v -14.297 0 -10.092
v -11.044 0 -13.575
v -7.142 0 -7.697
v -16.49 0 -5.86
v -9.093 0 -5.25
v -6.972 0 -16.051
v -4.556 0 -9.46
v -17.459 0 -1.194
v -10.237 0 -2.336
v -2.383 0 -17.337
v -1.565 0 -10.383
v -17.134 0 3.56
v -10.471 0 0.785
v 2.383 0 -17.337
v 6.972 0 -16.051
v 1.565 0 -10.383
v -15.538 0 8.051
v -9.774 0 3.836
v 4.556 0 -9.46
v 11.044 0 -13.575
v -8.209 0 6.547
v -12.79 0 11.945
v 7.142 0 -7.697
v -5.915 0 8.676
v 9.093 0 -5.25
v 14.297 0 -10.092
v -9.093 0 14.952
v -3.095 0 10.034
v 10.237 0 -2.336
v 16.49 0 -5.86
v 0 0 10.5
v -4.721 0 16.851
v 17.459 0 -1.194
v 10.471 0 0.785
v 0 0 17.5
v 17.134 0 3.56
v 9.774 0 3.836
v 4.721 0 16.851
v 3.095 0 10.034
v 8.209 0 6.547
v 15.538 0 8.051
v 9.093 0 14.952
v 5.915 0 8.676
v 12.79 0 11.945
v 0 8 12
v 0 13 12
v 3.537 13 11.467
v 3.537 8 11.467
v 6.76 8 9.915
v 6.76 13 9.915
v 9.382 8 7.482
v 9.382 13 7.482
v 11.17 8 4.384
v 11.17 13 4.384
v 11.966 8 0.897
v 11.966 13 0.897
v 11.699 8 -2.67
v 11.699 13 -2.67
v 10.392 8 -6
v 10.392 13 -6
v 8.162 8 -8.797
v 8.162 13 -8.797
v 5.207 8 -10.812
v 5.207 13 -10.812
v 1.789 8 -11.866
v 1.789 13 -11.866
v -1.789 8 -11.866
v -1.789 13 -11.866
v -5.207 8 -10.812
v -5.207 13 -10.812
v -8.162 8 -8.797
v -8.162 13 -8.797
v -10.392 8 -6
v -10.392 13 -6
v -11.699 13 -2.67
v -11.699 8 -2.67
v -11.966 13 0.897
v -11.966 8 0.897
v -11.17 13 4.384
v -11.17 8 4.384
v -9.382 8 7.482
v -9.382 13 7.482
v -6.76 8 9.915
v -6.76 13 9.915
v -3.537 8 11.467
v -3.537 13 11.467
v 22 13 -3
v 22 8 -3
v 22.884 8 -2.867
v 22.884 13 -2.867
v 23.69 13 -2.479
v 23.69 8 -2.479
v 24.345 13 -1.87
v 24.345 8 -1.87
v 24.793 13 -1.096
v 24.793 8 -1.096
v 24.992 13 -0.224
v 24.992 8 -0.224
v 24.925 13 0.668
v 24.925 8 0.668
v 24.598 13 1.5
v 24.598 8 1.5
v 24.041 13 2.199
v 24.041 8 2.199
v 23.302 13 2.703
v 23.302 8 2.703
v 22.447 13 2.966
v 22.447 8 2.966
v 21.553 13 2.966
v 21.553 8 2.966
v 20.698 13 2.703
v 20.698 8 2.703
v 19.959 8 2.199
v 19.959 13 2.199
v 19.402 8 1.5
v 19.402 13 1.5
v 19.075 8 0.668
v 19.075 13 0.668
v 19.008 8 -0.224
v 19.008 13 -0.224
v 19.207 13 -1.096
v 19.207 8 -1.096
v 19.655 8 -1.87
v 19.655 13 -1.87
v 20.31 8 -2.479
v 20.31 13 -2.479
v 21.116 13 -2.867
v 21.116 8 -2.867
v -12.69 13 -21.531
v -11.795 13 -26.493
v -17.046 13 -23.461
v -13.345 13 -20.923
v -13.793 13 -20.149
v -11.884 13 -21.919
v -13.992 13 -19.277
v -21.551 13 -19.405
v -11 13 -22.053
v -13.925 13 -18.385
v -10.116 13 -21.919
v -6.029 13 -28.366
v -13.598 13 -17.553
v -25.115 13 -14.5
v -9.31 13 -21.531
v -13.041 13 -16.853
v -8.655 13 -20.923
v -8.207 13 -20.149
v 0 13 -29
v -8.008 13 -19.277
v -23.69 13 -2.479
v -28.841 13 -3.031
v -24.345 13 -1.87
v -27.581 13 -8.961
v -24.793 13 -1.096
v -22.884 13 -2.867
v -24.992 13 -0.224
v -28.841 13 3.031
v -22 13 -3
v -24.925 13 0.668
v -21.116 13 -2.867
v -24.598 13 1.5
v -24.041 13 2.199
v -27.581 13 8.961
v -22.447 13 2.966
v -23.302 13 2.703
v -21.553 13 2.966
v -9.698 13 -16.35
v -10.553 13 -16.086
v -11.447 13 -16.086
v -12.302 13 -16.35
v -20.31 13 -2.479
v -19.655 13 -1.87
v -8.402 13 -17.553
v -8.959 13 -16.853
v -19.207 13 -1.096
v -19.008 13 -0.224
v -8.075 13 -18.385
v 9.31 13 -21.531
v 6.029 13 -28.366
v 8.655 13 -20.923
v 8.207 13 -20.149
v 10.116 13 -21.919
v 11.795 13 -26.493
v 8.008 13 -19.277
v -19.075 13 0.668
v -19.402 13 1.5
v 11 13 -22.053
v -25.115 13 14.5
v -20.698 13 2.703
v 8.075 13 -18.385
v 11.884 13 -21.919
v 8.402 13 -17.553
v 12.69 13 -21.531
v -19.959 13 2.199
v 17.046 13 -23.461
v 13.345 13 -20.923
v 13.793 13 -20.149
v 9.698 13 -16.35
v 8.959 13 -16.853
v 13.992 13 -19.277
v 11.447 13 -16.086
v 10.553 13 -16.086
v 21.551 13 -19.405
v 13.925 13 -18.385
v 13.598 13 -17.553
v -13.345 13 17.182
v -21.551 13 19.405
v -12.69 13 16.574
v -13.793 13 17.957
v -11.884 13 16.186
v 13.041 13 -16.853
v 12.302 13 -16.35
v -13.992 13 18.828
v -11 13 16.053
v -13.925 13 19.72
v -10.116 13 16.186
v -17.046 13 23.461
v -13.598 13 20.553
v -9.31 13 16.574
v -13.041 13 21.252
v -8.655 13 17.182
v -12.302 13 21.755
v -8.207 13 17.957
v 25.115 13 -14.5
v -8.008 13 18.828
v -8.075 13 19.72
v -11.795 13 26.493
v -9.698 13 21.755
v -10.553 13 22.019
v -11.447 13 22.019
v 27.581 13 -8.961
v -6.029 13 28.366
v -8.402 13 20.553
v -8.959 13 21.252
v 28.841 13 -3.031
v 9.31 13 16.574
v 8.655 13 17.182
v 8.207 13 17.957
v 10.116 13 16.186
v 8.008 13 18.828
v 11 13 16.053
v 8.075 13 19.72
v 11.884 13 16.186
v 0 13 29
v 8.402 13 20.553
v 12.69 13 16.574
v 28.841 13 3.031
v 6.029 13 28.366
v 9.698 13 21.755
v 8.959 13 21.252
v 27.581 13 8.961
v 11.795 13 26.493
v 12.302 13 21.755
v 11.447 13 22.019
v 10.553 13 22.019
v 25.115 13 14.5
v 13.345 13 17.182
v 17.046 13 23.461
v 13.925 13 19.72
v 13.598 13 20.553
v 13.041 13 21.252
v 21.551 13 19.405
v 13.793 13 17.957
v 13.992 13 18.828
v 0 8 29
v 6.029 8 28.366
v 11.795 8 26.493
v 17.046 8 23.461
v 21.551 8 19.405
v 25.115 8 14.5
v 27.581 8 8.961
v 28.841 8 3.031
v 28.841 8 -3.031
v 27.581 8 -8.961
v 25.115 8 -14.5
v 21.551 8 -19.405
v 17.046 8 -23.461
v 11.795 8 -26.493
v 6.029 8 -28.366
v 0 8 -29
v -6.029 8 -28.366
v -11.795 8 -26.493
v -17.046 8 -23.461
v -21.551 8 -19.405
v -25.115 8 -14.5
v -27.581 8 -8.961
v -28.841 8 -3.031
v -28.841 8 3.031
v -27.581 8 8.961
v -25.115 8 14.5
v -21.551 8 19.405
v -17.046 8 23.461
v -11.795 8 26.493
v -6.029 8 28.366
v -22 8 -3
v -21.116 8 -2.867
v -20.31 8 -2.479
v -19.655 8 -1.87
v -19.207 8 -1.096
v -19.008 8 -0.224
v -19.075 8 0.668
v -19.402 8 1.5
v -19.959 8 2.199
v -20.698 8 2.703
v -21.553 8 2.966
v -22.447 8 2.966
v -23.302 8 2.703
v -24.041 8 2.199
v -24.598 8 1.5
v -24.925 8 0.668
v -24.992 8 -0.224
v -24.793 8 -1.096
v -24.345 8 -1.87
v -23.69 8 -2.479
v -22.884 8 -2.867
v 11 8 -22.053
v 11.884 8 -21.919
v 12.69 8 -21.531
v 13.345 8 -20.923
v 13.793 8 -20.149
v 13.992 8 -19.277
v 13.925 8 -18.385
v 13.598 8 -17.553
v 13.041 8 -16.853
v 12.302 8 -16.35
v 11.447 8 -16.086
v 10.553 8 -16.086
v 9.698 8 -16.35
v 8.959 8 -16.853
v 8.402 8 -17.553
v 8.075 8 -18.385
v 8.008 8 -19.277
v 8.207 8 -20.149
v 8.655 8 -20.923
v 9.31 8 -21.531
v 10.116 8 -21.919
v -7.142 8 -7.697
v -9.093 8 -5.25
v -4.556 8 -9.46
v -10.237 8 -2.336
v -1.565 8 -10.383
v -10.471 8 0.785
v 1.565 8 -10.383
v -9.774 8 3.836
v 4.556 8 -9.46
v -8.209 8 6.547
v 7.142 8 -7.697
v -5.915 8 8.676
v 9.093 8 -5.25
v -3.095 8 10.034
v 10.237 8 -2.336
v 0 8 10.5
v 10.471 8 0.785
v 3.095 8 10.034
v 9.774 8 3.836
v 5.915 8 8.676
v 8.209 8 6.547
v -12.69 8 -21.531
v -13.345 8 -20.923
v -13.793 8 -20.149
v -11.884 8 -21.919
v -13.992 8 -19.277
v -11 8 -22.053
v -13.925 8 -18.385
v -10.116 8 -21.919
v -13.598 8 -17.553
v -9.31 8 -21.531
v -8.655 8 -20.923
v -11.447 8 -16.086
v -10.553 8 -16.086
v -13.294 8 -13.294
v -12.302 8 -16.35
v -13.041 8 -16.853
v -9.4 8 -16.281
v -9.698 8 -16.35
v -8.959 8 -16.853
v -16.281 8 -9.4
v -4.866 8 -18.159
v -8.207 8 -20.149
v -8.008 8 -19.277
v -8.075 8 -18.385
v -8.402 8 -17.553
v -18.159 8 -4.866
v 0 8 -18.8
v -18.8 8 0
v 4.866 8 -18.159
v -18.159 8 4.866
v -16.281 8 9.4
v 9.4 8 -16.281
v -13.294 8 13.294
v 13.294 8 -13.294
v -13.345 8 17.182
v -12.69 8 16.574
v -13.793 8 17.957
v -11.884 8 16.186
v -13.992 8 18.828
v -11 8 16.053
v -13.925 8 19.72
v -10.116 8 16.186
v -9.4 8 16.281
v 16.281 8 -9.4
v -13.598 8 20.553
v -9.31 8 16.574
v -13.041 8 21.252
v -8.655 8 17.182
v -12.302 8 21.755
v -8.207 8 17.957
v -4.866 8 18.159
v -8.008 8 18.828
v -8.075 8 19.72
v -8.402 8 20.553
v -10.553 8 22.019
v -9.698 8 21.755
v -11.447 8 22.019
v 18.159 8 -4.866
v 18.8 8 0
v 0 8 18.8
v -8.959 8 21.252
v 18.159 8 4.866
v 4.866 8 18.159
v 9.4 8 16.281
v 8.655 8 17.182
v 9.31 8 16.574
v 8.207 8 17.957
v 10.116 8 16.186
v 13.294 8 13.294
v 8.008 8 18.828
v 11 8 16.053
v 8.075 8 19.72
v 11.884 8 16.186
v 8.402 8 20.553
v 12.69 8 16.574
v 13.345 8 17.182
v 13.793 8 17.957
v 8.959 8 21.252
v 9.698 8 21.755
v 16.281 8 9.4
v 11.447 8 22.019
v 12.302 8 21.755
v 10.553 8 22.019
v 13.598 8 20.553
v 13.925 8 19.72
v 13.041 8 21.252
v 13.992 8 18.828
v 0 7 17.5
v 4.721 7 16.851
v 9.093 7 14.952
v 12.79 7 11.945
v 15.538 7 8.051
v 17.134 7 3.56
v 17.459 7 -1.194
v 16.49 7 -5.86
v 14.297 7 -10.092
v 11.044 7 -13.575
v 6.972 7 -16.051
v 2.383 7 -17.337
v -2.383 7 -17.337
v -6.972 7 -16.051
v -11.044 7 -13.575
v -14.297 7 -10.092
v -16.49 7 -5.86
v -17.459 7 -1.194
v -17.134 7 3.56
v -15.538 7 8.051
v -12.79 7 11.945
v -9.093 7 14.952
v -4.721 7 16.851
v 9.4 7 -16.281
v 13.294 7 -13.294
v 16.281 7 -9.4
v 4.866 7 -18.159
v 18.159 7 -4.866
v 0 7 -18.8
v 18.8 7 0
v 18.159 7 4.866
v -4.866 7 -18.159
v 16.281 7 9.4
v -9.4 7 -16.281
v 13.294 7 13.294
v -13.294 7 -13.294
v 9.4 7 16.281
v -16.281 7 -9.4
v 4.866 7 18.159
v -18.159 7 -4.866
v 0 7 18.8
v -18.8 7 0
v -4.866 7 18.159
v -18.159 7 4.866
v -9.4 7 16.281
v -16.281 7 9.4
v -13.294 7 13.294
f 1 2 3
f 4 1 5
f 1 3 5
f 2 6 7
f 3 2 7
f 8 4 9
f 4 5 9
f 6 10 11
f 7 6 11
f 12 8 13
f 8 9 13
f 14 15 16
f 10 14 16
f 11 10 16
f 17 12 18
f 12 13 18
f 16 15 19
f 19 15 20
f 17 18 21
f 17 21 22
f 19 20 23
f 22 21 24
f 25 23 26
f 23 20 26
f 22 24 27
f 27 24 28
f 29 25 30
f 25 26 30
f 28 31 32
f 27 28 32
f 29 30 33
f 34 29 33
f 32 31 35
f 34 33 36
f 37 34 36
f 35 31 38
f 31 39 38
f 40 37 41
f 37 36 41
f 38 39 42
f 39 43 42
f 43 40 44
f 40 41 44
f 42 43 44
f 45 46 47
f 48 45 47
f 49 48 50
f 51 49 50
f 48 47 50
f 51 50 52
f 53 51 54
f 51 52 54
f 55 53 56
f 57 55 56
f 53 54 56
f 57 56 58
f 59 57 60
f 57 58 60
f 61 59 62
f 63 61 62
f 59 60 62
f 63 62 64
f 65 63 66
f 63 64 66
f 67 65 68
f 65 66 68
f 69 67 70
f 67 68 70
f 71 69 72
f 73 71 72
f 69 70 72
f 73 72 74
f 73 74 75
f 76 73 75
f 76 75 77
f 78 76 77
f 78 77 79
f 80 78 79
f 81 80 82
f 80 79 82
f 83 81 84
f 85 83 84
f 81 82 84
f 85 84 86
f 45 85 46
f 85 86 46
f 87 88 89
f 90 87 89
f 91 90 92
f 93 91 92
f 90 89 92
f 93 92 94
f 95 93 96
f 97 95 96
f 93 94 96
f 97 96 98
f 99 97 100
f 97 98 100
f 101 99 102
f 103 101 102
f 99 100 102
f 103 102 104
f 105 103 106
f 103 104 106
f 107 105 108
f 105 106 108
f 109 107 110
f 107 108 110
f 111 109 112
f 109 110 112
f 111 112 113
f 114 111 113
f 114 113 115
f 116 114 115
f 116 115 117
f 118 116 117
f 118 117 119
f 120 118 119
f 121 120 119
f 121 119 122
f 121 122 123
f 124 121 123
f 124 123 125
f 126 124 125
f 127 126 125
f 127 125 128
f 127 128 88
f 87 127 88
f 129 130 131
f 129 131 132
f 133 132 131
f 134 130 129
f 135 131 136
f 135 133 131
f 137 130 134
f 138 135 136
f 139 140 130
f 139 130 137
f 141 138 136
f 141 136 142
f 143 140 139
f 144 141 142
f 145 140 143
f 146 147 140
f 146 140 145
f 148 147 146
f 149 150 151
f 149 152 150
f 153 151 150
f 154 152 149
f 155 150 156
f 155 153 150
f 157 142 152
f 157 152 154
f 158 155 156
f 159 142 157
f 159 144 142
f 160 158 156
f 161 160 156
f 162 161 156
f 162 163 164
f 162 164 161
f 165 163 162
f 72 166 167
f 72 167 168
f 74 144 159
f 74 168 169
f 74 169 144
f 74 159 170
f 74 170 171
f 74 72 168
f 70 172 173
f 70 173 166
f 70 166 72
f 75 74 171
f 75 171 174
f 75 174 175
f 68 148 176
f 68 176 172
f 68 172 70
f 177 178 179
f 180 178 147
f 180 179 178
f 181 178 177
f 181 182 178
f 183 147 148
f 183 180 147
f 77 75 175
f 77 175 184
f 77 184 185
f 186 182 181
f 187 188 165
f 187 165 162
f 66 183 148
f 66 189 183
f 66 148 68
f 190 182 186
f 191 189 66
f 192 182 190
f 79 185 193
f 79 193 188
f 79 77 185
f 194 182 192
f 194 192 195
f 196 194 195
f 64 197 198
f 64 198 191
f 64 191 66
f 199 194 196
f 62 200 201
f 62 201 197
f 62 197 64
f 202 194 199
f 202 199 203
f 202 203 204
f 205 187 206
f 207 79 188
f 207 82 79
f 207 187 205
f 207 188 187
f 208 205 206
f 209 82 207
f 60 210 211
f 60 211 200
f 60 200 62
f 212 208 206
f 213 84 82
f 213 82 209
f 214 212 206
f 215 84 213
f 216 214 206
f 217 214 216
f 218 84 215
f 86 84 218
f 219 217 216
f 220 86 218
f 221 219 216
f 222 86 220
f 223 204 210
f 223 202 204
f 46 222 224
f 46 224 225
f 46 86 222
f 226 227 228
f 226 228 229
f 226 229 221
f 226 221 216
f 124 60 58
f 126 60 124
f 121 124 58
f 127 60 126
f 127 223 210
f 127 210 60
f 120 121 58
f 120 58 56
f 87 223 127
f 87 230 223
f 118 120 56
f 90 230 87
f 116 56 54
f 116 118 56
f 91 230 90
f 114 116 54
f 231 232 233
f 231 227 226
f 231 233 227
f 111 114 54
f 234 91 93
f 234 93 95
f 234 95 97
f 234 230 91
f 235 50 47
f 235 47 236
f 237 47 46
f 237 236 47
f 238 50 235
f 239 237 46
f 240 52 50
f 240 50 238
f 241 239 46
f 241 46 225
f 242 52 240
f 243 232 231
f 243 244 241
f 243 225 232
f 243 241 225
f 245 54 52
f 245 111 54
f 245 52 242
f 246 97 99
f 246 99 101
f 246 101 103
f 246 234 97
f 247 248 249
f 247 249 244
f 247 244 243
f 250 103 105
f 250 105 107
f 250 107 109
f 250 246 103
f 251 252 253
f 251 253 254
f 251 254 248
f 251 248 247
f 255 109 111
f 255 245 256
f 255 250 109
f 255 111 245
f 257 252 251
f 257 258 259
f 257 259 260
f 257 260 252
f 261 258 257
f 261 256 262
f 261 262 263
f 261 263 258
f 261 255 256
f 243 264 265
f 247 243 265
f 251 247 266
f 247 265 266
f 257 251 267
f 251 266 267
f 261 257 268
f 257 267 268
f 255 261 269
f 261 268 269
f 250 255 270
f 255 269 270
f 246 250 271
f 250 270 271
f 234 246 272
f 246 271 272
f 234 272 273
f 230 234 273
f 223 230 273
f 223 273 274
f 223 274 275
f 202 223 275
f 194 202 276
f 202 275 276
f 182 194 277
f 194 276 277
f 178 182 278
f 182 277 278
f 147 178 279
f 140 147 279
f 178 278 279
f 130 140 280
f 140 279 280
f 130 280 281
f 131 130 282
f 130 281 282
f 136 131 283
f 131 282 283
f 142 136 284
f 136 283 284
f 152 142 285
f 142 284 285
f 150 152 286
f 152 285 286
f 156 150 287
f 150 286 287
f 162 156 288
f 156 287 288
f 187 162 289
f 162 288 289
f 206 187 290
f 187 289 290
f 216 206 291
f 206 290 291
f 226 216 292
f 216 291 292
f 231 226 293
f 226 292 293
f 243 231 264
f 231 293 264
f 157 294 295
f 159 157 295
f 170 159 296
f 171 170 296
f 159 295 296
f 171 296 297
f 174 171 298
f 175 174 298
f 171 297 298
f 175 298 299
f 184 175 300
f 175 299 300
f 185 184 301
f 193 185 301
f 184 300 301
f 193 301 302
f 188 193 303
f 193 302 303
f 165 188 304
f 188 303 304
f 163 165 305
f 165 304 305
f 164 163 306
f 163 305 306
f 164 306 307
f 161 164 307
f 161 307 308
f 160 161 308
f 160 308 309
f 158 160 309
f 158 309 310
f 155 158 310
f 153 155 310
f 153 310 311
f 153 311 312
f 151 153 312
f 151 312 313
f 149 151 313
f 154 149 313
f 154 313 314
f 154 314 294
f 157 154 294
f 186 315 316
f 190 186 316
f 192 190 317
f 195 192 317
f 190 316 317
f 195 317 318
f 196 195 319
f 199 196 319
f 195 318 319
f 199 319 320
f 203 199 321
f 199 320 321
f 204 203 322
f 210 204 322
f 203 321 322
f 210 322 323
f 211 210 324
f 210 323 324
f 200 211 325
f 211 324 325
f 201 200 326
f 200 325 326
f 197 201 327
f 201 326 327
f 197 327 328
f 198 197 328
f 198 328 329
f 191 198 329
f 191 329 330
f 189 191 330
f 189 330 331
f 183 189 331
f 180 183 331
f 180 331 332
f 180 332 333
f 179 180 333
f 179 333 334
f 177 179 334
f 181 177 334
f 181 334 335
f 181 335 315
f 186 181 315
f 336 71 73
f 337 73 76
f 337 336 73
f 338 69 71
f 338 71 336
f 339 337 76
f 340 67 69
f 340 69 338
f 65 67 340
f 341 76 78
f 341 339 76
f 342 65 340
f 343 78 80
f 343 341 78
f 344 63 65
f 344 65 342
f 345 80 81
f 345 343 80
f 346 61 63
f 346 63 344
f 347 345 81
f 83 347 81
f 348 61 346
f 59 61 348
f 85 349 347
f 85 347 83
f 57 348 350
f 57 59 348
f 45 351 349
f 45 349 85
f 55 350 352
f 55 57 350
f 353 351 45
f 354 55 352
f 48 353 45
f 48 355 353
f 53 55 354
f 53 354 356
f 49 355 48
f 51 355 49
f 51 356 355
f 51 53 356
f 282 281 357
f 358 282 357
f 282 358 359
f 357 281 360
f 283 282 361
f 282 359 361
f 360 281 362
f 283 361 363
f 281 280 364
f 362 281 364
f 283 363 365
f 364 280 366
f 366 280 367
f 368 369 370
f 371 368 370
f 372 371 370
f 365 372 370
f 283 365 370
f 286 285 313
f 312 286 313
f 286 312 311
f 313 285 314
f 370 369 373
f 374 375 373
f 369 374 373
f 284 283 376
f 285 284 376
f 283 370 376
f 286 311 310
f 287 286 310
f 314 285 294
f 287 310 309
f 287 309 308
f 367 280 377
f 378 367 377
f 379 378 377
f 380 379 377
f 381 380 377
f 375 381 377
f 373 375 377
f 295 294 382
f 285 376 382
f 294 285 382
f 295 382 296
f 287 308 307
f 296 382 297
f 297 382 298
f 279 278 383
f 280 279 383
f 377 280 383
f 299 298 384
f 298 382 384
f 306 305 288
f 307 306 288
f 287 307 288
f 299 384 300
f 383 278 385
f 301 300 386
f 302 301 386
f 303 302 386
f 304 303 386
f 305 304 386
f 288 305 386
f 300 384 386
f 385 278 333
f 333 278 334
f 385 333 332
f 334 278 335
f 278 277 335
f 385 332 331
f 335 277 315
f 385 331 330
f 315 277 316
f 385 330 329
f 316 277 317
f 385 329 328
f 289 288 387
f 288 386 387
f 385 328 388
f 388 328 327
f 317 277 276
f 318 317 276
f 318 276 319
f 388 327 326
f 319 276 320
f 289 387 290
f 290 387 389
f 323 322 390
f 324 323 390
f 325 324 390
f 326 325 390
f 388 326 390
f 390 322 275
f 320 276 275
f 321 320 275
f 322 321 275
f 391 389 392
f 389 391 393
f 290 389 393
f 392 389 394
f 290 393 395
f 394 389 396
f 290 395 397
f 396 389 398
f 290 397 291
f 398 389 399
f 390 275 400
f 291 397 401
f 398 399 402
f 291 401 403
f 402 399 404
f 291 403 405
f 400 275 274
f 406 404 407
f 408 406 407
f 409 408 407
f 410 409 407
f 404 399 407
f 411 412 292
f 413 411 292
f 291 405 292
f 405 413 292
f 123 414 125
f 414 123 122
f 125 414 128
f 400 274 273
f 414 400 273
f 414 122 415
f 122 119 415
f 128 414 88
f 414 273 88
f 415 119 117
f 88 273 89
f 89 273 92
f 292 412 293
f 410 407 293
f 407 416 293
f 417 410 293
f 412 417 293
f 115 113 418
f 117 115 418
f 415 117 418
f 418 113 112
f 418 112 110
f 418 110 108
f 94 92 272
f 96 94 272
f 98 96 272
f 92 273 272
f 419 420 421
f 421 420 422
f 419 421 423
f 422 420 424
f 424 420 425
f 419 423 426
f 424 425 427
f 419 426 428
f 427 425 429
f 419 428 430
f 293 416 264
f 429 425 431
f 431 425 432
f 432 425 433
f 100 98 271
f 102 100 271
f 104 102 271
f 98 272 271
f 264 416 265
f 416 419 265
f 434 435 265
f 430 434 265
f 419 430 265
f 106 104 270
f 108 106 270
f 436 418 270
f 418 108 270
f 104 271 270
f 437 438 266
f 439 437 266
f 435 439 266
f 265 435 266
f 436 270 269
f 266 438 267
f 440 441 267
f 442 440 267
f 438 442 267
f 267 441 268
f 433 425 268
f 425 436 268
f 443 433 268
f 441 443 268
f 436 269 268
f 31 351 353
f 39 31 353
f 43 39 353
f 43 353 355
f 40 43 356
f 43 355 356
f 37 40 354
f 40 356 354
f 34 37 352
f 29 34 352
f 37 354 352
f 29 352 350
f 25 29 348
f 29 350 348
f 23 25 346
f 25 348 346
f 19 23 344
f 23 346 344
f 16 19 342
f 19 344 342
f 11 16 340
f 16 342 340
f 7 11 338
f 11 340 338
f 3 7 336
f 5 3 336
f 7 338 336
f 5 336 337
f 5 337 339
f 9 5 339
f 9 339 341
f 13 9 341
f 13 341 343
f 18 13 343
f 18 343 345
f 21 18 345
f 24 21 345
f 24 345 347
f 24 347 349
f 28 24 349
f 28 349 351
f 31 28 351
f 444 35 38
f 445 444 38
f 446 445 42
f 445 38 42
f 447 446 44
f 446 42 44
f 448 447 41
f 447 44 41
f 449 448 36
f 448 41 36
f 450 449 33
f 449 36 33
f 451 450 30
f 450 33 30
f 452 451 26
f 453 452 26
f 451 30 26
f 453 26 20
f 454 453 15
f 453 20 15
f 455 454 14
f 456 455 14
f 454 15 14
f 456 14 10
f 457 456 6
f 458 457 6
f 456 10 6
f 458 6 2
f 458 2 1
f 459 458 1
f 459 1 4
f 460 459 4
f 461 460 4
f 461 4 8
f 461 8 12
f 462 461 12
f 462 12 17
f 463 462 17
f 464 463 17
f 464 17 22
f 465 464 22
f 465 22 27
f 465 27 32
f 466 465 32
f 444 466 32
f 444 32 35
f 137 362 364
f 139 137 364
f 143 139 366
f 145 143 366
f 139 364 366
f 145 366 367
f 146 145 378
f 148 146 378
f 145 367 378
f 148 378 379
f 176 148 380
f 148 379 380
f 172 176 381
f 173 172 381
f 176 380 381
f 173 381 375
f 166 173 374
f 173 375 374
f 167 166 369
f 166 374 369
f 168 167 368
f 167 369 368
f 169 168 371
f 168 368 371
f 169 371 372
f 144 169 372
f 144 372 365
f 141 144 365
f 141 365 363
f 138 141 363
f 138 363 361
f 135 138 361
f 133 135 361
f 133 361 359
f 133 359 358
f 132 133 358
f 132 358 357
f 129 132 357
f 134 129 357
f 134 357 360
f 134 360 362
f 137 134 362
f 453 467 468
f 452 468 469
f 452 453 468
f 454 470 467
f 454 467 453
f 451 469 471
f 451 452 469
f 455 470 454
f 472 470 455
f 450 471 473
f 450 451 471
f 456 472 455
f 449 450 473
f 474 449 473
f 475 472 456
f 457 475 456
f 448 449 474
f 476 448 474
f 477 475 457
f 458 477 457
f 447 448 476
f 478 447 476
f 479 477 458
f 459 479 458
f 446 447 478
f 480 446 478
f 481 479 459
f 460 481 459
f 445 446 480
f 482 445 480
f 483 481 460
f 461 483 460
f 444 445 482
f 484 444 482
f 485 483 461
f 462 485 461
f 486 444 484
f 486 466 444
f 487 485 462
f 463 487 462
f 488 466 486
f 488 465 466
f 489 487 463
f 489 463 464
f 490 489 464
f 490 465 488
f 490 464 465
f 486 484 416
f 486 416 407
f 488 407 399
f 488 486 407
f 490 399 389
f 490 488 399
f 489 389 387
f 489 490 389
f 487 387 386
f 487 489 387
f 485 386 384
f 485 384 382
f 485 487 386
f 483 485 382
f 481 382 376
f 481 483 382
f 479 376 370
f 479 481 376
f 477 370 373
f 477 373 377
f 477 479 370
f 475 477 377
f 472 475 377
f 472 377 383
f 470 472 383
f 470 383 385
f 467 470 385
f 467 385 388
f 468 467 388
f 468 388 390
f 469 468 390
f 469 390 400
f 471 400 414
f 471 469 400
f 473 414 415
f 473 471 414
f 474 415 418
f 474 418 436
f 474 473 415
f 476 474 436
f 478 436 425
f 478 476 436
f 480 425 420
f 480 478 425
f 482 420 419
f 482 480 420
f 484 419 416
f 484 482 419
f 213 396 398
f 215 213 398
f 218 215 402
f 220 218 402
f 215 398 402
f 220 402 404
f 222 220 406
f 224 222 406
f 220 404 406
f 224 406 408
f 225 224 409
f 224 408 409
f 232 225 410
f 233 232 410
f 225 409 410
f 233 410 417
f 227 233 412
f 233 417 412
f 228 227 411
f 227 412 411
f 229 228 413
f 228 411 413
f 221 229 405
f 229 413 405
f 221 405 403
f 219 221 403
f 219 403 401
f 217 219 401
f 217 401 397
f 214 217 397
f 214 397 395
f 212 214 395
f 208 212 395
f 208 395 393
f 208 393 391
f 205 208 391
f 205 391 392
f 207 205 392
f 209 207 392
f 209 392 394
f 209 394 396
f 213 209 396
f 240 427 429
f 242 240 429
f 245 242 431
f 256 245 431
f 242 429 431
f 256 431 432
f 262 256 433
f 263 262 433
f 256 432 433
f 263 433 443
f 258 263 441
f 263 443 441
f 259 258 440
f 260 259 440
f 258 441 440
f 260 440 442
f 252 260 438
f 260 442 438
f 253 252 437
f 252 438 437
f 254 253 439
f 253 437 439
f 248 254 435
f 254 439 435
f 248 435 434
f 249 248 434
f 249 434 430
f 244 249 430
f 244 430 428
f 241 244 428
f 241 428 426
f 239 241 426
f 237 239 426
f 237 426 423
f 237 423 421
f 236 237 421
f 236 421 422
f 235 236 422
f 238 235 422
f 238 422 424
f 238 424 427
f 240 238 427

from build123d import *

# Parameters (mm, degrees)
SKETCH1_R           = 17.5
BOSS_EXTRUDE1_DEPTH = 8
SKETCH2_R           = 29
BOSS_EXTRUDE2_DEPTH = 5
SKETCH3_R           = 12
CUT_EXTRUDE1_DEPTH  = 5
SKETCH4_R           = 10.5
CUT_EXTRUDE2_DEPTH  = 42.785164832
CUT_EXTRUDE3_REACH  = 43.785
SKETCH5_R           = 3
BOSS_EXTRUDE3_START = 1
SKETCH6_R           = 18.8
SKETCH6_R_2         = 17.5
BOSS_EXTRUDE3_DEPTH = 1


with BuildPart() as part:
    # Sketch1 → Boss-Extrude1 (new body)
    with BuildSketch(Plane(origin=(0, 0, 0), x_dir=(1, 0, 0), z_dir=(0, 1, 0))):
        with Locations(Location((0, 0, 0), (0, 0, 270))):
            Circle(SKETCH1_R)
    extrude(amount=BOSS_EXTRUDE1_DEPTH)

    # Sketch2 → Boss-Extrude2 (add)
    with BuildSketch(Plane(origin=(0, 8, 0), x_dir=(1, 0, 0), z_dir=(0, 1, 0))):
        with Locations(Location((0, 0, 0), (0, 0, 270))):
            Circle(SKETCH2_R)
    extrude(amount=BOSS_EXTRUDE2_DEPTH)

    # Sketch3 → Cut-Extrude1 (cut)
    with BuildSketch(Plane(origin=(0, 13, 0), x_dir=(1, 0, 0), z_dir=(0, 1, 0))):
        with Locations(Location((0, 0, 0), (0, 0, 270))):
            Circle(SKETCH3_R)
    extrude(amount=-CUT_EXTRUDE1_DEPTH, mode=Mode.SUBTRACT)

    # Sketch4 → Cut-Extrude2 (cut, through all)
    with BuildSketch(Plane(origin=(0, 8, 0), x_dir=(1, 0, 0), z_dir=(0, 1, 0))):
        with Locations(Location((0, 0, 0), (0, 0, 270))):
            Circle(SKETCH4_R)
    extrude(amount=-CUT_EXTRUDE2_DEPTH, mode=Mode.SUBTRACT)

    # Sketch5 → Cut-Extrude3 (cut, up to next)
    with BuildSketch(Plane.XZ.offset(-8), mode=Mode.PRIVATE) as cut_extrude3_sk1:
        with Locations(Location((22, 0, 0), (0, 0, 270))):
            Circle(SKETCH5_R)
    cut_extrude3_tool1 = extrude(cut_extrude3_sk1.sketch, amount=-CUT_EXTRUDE3_REACH, mode=Mode.PRIVATE) & part.part
    # Sketch5 → Cut-Extrude3 (cut, up to next)
    with BuildSketch(Plane.XZ.offset(-8), mode=Mode.PRIVATE) as cut_extrude3_sk2:
        with Locations(Location((11, -19.052558883, 0), (0, 0, 270))):
            Circle(SKETCH5_R)
    cut_extrude3_tool2 = extrude(cut_extrude3_sk2.sketch, amount=-CUT_EXTRUDE3_REACH, mode=Mode.PRIVATE) & part.part
    # Sketch5 → Cut-Extrude3 (cut, up to next)
    with BuildSketch(Plane.XZ.offset(-8), mode=Mode.PRIVATE) as cut_extrude3_sk3:
        with Locations(Location((-11, -19.052558883, 0), (0, 0, 270))):
            Circle(SKETCH5_R)
    cut_extrude3_tool3 = extrude(cut_extrude3_sk3.sketch, amount=-CUT_EXTRUDE3_REACH, mode=Mode.PRIVATE) & part.part
    # Sketch5 → Cut-Extrude3 (cut, up to next)
    with BuildSketch(Plane.XZ.offset(-8), mode=Mode.PRIVATE) as cut_extrude3_sk4:
        with Locations(Location((-22, 0, 0), (0, 0, 270))):
            Circle(SKETCH5_R)
    cut_extrude3_tool4 = extrude(cut_extrude3_sk4.sketch, amount=-CUT_EXTRUDE3_REACH, mode=Mode.PRIVATE) & part.part
    # Sketch5 → Cut-Extrude3 (cut, up to next)
    with BuildSketch(Plane.XZ.offset(-8), mode=Mode.PRIVATE) as cut_extrude3_sk5:
        with Locations(Location((-11, 19.052558883, 0), (0, 0, 270))):
            Circle(SKETCH5_R)
    cut_extrude3_tool5 = extrude(cut_extrude3_sk5.sketch, amount=-CUT_EXTRUDE3_REACH, mode=Mode.PRIVATE) & part.part
    # Sketch5 → Cut-Extrude3 (cut, up to next)
    with BuildSketch(Plane.XZ.offset(-8), mode=Mode.PRIVATE) as cut_extrude3_sk6:
        with Locations(Location((11, 19.052558883, 0), (0, 0, 270))):
            Circle(SKETCH5_R)
    cut_extrude3_tool6 = extrude(cut_extrude3_sk6.sketch, amount=-CUT_EXTRUDE3_REACH, mode=Mode.PRIVATE) & part.part
    add(cut_extrude3_tool1.solids().sort_by_distance((22, 8, 0))[0], mode=Mode.SUBTRACT)
    add(cut_extrude3_tool2.solids().sort_by_distance((11, 8, -19.052559))[0], mode=Mode.SUBTRACT)
    add(cut_extrude3_tool3.solids().sort_by_distance((-11, 8, -19.052559))[0], mode=Mode.SUBTRACT)
    add(cut_extrude3_tool4.solids().sort_by_distance((-22, 8, 0))[0], mode=Mode.SUBTRACT)
    add(cut_extrude3_tool5.solids().sort_by_distance((-11, 8, 19.052559))[0], mode=Mode.SUBTRACT)
    add(cut_extrude3_tool6.solids().sort_by_distance((11, 8, 19.052559))[0], mode=Mode.SUBTRACT)

    # Sketch6 → Boss-Extrude3 (add)
    with BuildSketch(Plane.XZ.offset(-8).offset(BOSS_EXTRUDE3_START)):
        with Locations(Location((0, 0, 0), (0, 0, 90))):
            Circle(SKETCH6_R)
        with Locations(Location((0, 0, 0), (0, 0, 270))):
            Circle(SKETCH6_R_2, mode=Mode.SUBTRACT)
    extrude(amount=-BOSS_EXTRUDE3_DEPTH)


solid = part.part
